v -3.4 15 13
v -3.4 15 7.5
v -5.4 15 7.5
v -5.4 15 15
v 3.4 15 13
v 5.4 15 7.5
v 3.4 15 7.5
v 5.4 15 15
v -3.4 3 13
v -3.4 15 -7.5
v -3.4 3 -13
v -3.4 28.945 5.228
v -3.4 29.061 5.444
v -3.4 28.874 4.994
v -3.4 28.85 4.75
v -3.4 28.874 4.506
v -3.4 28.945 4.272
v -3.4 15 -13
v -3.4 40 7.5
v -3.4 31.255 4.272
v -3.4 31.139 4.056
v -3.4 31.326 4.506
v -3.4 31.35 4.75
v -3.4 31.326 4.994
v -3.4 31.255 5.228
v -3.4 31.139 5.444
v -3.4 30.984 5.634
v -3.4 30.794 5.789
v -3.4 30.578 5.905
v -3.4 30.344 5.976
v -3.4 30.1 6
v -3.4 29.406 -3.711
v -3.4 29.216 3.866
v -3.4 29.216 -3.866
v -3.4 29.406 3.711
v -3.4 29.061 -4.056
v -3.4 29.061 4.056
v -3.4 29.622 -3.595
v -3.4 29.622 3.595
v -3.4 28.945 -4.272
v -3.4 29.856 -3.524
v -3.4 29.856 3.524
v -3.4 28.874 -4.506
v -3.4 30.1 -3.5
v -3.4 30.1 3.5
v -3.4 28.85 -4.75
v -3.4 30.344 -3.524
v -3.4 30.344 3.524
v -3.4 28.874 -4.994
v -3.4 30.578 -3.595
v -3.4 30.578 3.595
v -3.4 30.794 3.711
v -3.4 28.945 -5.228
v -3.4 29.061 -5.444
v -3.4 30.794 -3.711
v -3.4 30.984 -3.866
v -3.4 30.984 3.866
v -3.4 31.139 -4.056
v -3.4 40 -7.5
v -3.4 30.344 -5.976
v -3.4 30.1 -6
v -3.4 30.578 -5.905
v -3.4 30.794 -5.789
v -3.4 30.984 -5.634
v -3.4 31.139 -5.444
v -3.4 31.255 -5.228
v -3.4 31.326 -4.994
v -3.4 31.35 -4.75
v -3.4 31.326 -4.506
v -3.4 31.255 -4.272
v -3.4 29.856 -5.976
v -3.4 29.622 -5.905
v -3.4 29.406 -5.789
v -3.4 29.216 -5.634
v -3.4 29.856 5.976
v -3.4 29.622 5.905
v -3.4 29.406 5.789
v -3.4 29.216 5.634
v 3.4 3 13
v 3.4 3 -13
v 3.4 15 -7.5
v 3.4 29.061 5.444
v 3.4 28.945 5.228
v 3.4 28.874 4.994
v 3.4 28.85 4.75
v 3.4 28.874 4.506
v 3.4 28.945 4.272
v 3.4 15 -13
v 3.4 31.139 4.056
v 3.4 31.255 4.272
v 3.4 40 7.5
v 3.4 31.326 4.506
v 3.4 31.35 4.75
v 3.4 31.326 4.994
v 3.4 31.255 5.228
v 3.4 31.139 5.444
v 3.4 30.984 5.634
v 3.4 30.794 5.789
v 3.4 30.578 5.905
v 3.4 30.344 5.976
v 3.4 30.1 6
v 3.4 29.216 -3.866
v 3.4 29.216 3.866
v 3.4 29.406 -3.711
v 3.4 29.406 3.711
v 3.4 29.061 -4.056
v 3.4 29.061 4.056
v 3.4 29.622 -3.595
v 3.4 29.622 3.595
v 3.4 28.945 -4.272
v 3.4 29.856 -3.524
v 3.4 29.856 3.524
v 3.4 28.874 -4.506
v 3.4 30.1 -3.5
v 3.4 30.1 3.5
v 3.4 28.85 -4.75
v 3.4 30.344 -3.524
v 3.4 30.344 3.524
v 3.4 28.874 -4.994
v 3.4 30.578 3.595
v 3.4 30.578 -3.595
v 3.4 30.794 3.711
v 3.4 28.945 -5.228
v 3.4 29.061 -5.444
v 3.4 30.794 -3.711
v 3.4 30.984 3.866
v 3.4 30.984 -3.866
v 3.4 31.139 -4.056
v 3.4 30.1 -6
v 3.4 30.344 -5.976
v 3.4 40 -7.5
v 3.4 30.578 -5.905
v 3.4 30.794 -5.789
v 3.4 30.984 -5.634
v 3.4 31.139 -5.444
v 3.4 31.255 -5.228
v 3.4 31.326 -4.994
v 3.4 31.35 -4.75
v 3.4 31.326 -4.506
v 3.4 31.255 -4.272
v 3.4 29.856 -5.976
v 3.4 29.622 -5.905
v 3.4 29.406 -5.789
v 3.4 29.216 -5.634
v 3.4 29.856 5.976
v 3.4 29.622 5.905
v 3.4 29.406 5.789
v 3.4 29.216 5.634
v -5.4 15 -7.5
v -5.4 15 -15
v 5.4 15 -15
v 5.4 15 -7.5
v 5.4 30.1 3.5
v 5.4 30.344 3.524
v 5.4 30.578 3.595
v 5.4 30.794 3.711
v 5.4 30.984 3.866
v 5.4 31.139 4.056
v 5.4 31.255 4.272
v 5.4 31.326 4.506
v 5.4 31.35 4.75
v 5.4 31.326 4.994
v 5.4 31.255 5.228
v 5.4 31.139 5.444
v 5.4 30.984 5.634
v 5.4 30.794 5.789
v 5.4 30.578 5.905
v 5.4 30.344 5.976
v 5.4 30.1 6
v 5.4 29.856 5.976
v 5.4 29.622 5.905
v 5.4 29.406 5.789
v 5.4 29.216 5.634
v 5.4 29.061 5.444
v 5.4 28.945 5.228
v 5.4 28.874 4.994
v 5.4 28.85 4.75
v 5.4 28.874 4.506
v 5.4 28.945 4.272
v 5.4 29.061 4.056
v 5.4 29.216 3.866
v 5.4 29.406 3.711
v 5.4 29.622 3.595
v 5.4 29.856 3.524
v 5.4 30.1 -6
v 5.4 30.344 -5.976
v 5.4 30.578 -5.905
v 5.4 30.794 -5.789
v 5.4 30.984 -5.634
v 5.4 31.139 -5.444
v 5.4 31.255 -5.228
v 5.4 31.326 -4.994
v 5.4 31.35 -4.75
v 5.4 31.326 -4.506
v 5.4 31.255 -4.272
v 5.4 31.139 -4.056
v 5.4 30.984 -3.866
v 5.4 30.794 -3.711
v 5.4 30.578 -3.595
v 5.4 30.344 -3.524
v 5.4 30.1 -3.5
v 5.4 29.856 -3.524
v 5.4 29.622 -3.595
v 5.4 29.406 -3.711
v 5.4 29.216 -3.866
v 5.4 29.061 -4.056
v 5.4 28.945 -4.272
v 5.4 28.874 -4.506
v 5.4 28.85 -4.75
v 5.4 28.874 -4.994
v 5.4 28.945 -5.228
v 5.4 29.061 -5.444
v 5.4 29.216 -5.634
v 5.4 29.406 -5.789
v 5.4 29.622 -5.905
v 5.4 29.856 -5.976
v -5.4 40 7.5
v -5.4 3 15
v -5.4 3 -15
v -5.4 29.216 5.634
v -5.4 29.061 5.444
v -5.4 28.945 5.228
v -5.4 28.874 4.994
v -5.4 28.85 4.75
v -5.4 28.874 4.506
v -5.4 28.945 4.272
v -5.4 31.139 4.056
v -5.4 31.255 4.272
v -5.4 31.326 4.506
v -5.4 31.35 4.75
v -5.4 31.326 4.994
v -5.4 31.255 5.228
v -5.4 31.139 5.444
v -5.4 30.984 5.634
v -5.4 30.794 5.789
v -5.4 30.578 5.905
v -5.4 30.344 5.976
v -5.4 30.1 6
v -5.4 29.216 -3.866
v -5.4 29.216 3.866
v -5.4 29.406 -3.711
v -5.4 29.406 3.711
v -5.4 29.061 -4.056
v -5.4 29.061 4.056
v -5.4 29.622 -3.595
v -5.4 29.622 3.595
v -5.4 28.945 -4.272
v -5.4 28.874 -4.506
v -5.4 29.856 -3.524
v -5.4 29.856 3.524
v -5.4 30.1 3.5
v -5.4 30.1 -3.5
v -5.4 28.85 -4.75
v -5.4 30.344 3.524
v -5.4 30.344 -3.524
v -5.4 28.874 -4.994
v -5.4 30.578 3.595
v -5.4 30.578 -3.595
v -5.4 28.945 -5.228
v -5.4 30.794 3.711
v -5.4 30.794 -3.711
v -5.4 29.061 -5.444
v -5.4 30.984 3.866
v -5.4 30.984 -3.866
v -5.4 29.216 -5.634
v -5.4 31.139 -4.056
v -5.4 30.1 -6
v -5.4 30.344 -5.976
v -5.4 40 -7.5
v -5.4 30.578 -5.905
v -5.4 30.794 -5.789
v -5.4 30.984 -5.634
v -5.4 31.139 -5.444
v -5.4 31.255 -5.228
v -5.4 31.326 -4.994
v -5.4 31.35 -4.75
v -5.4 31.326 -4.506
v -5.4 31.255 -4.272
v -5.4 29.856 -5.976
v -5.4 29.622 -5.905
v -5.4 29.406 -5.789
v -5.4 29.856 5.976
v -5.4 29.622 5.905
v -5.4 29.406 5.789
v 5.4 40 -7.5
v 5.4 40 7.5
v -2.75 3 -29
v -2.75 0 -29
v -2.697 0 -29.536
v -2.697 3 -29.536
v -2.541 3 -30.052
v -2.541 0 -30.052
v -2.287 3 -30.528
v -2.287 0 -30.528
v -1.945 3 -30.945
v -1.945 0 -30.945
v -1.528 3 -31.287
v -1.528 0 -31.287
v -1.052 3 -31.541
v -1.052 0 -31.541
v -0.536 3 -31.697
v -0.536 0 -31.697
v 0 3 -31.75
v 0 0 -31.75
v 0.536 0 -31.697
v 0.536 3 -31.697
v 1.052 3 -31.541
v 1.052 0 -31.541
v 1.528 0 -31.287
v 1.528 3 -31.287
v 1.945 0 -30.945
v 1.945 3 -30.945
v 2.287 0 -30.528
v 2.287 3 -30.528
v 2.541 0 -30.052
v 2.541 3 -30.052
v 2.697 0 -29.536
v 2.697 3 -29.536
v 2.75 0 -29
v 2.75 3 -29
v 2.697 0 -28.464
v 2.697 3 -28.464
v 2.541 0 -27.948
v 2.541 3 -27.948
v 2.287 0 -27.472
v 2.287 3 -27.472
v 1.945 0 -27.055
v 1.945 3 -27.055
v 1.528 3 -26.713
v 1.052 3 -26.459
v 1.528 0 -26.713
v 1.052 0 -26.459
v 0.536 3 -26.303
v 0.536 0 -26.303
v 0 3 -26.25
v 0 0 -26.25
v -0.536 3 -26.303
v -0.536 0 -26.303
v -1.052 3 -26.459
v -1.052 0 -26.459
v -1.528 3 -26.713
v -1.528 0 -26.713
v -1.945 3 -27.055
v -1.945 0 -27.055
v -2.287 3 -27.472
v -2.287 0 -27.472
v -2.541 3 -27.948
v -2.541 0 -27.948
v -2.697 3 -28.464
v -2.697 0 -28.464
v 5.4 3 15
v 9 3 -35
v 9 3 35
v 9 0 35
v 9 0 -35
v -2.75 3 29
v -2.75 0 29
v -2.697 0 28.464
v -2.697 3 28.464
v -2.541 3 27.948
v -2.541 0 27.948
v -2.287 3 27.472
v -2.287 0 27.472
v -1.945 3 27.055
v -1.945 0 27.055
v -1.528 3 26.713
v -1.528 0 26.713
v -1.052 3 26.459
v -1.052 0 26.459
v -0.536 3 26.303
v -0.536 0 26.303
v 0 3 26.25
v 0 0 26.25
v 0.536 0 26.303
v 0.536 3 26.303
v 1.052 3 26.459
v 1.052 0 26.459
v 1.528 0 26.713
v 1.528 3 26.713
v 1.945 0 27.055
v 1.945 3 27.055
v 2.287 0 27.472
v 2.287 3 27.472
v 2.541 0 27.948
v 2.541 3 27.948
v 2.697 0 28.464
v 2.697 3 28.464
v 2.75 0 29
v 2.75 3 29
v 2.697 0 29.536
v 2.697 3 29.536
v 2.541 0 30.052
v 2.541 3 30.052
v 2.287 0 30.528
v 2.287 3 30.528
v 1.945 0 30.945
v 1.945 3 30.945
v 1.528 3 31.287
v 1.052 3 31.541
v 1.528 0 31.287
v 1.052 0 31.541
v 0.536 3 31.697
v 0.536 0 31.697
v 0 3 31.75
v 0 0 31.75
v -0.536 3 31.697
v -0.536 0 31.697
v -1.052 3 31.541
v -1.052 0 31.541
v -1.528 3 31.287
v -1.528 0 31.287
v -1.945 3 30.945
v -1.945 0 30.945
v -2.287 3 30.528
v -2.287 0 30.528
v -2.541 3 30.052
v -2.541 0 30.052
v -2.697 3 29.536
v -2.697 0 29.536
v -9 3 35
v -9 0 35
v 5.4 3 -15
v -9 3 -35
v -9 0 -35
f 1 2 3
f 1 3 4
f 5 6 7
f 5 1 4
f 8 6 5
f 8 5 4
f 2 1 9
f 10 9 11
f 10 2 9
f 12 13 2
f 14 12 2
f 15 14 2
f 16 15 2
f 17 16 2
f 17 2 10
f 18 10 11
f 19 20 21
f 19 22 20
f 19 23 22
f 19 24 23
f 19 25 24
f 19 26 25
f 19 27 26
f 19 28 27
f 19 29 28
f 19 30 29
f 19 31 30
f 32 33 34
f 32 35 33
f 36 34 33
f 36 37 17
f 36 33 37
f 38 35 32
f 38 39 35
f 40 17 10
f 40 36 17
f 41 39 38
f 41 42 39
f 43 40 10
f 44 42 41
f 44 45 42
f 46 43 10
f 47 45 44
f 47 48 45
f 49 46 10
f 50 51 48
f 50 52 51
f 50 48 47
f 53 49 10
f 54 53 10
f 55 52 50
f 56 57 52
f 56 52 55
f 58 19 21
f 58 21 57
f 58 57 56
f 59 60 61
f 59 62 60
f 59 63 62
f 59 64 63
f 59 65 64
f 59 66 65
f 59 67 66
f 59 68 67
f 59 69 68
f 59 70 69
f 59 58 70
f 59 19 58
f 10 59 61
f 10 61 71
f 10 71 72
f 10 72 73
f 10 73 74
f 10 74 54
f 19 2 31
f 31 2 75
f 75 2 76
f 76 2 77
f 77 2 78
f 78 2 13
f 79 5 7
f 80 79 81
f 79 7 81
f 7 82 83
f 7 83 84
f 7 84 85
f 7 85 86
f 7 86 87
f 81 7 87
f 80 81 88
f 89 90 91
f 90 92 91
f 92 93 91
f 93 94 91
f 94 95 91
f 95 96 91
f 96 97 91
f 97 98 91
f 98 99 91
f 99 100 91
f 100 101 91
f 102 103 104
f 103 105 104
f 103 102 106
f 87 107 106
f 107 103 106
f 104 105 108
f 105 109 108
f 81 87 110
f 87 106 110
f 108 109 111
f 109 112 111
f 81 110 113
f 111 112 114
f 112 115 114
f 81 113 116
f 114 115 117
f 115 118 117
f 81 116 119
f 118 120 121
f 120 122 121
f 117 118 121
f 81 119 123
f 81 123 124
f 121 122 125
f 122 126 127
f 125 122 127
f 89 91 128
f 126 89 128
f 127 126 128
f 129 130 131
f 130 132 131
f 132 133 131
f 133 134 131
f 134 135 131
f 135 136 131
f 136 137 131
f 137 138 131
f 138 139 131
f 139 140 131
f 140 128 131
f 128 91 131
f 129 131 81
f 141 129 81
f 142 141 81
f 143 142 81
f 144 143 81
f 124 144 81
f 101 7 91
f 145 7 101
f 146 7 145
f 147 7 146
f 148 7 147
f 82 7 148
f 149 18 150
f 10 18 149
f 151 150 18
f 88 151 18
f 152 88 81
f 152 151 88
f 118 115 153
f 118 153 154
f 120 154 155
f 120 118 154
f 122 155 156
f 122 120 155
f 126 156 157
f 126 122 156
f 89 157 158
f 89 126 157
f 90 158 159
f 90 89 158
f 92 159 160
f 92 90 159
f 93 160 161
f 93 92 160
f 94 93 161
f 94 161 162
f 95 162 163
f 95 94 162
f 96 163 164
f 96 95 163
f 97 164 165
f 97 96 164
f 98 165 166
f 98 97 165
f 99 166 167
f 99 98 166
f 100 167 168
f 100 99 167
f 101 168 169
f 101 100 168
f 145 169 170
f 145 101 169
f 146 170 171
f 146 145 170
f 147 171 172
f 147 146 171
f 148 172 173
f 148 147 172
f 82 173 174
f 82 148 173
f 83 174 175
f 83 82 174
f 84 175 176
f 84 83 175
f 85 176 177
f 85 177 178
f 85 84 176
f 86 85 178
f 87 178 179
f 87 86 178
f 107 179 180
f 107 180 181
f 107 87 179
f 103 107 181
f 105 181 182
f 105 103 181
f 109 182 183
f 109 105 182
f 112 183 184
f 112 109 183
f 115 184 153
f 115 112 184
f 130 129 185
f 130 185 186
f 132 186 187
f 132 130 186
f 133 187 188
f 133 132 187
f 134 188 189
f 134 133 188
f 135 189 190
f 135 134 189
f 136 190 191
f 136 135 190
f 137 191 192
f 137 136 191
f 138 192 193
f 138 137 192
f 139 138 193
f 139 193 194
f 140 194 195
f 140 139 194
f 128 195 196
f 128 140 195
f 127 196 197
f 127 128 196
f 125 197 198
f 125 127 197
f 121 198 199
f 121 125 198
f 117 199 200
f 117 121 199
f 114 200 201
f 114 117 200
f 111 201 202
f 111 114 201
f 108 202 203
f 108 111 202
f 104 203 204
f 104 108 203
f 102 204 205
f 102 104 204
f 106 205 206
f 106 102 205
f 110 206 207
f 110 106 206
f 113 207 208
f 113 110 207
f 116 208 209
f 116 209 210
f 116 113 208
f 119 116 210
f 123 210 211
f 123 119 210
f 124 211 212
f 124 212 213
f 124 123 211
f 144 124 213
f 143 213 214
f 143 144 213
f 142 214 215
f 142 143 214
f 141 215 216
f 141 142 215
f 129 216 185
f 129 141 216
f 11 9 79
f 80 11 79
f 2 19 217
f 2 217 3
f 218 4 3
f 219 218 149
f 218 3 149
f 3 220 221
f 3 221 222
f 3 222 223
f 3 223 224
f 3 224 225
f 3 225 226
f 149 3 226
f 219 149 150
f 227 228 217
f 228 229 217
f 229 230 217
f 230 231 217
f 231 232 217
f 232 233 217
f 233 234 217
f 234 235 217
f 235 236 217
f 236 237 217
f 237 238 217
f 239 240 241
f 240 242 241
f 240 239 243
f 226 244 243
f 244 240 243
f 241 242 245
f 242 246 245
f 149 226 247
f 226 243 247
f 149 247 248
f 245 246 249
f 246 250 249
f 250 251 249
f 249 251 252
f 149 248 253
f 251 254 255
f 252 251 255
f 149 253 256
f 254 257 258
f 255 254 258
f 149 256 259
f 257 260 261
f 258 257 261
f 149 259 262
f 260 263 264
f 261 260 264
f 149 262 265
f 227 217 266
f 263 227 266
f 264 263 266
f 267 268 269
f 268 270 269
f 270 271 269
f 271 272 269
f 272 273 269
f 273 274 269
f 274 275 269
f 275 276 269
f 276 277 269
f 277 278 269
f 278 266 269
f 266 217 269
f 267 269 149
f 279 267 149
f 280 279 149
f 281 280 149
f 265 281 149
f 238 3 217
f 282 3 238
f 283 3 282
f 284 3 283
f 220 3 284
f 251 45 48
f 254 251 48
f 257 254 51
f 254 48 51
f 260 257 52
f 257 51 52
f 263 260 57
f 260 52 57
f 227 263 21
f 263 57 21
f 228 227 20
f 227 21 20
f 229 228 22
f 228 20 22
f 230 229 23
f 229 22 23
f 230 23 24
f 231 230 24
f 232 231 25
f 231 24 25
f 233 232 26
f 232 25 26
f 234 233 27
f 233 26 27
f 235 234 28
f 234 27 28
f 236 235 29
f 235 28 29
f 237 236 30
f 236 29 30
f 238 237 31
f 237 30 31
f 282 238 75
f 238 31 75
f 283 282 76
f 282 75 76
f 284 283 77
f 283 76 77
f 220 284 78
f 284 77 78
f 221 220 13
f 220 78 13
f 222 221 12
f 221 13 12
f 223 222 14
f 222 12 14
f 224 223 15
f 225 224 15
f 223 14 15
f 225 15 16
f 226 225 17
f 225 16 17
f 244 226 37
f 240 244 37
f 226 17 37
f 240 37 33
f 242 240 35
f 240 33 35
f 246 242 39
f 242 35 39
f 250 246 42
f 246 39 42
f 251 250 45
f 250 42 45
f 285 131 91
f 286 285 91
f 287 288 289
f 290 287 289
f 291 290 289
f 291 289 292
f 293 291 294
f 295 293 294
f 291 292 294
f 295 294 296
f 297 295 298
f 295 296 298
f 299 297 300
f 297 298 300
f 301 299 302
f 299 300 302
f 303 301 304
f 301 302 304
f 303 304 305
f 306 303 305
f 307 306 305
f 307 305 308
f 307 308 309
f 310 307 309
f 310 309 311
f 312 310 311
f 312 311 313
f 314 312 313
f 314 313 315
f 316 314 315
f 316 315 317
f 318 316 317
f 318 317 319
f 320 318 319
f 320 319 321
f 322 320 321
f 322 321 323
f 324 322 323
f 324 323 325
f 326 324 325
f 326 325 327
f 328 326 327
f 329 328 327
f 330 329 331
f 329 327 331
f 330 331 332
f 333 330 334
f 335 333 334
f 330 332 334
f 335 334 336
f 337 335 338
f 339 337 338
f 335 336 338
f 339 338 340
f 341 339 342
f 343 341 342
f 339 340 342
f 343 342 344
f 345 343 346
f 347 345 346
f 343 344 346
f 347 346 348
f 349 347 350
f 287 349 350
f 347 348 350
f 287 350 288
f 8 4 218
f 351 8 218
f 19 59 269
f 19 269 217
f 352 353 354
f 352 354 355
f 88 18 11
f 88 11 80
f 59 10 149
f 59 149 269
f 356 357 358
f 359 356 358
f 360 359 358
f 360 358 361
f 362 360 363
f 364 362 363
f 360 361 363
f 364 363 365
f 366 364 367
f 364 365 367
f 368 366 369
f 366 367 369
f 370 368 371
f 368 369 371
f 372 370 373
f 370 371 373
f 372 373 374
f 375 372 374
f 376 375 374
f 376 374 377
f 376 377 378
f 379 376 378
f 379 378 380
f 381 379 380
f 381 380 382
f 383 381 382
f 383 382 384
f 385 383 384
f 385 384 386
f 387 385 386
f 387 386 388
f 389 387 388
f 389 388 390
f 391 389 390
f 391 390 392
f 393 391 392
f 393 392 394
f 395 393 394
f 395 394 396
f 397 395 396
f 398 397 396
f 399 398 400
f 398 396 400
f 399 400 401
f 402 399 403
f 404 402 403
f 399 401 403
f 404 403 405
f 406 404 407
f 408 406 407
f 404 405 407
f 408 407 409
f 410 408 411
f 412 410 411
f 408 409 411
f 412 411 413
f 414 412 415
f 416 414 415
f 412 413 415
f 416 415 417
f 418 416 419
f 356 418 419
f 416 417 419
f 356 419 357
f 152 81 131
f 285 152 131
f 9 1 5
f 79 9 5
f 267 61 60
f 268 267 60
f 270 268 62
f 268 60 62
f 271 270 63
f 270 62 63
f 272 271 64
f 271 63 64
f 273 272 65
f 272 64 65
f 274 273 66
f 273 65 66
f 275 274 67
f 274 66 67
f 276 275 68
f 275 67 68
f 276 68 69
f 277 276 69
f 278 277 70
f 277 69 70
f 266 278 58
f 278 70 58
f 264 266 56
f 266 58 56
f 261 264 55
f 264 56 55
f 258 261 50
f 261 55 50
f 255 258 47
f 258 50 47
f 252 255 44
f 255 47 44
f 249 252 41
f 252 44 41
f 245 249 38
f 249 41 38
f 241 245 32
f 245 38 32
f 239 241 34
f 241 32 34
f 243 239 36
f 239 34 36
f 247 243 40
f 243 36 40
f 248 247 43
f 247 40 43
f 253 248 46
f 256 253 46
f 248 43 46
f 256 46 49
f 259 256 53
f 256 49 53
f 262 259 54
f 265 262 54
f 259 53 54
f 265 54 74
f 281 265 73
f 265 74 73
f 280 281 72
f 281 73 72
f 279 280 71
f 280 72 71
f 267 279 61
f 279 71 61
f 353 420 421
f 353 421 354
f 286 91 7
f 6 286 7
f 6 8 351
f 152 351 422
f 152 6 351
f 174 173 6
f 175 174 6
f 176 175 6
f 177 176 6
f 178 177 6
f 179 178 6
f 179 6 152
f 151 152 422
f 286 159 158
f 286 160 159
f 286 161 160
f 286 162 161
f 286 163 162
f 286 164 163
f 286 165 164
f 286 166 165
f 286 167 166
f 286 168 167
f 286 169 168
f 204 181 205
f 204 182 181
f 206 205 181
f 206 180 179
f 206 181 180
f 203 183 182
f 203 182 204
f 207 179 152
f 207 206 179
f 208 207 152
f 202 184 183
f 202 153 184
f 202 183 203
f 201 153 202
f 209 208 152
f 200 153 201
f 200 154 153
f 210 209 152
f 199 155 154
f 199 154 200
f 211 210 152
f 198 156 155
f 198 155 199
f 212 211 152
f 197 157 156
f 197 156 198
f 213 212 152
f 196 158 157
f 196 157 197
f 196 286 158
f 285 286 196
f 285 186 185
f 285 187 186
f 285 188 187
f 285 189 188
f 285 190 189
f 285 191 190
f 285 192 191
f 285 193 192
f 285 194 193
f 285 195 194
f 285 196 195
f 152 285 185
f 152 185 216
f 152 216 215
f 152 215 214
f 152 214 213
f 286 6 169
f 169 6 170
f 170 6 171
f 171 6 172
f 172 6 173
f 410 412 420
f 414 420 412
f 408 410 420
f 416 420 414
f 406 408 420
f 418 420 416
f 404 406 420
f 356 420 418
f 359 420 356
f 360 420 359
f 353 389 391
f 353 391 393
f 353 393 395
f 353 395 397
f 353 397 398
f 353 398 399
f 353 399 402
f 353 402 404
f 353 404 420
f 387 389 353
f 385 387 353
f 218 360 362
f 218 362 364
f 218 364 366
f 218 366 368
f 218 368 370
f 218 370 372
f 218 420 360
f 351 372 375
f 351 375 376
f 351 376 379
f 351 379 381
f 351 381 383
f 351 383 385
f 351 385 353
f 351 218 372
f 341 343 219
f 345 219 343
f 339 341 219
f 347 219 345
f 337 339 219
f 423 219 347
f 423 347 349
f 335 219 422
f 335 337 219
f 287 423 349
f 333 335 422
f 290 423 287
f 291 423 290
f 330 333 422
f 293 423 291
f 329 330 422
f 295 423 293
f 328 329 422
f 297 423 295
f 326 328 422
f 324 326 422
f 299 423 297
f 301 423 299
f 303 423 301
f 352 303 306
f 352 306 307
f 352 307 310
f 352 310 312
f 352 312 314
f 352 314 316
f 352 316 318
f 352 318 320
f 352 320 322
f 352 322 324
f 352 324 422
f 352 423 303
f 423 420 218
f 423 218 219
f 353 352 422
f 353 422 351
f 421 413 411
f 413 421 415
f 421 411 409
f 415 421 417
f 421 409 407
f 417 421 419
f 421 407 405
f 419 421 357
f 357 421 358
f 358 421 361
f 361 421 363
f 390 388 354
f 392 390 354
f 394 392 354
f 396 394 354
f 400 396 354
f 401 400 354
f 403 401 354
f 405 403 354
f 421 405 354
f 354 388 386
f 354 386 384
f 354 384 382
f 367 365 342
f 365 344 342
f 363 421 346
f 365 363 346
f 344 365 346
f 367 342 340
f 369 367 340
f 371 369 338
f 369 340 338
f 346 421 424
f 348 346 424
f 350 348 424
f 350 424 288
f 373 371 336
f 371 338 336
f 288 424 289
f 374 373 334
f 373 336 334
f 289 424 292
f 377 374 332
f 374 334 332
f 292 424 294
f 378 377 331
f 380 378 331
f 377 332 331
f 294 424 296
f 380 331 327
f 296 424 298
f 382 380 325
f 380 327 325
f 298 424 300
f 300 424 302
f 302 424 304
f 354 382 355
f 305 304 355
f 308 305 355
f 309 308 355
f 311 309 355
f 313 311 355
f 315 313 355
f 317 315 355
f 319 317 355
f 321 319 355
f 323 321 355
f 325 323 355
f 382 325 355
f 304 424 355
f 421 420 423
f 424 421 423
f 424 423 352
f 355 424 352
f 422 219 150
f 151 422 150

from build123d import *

# Parameters (mm, degrees)
SKETCH1_W            = 45
SKETCH1_H            = 30
BOSS_EXTRUDE1_DEPTH  = 3
SKETCH3_R            = 1.25
BOSS_EXTRUDE2_DEPTH  = 2
SKETCH4_W            = 10.8
SKETCH4_H            = 12
BOSS_EXTRUDE3_DEPTH  = 2
SKETCH10_W           = 18
SKETCH10_H           = 70
BOSS_EXTRUDE4_DEPTH  = 3
SKETCH11_W           = 13.5
SKETCH11_H           = 30
CUT_EXTRUDE1_DEPTH   = 3
M5_CLEARANCE_HOLE1_D = 5.5


with BuildPart() as part:
    # Sketch1 → Boss-Extrude1 (new body)
    with BuildSketch(Plane(origin=(0, 0, 0), x_dir=(1, 0, 0), z_dir=(0, 1, 0))):
        Rectangle(SKETCH1_W, SKETCH1_H)
    extrude(amount=BOSS_EXTRUDE1_DEPTH)

    # Sketch3 → Boss-Extrude2 (add)
    with BuildSketch(Plane(origin=(-3.4, 0, 0), x_dir=(0, 0, -1), z_dir=(1, 0, 0))):
        Polygon((7.5, 40), (-7.5, 40), (-7.5, 15), (-15, 15), (-15, 0), (15, 0), (15, 15), (7.5, 15), align=None)
        with Locations((-4.75, 30.1)):
            Circle(SKETCH3_R, mode=Mode.SUBTRACT)
        with Locations((4.75, 30.1)):
            Circle(SKETCH3_R, mode=Mode.SUBTRACT)
    extrude(amount=-BOSS_EXTRUDE2_DEPTH)

    # Mirror1: part across plane


with BuildPart() as part_1:
    add(part.part)
    add(part.part.mirror(Plane(origin=(0, 0, 0), x_dir=(0, 0, 1), z_dir=(1, 0, 0))))

    # Sketch4 → Boss-Extrude3 (add)
    with BuildSketch(Plane.XY.offset(15)):
        with Locations((0, 9)):
            Rectangle(SKETCH4_W, SKETCH4_H)
    boss_extrude3 = extrude(amount=-BOSS_EXTRUDE3_DEPTH)

    # Mirror2: Boss-Extrude3 across plane
    add(boss_extrude3.mirror(Plane.XY))

    # Sketch10 → Boss-Extrude4 (add)
    with BuildSketch(Plane(origin=(0, 3, 0), x_dir=(1, 0, 0), z_dir=(0, 1, 0))):
        Rectangle(SKETCH10_W, SKETCH10_H)
    extrude(amount=-BOSS_EXTRUDE4_DEPTH)

    # Sketch11 → Cut-Extrude1 (cut)
    with BuildSketch(Plane(origin=(0, 3, 0), x_dir=(1, 0, 0), z_dir=(0, 1, 0))):
        with Locations((-15.75, 0)):
            Rectangle(SKETCH11_W, SKETCH11_H)
    cut_extrude1 = extrude(amount=-CUT_EXTRUDE1_DEPTH, mode=Mode.SUBTRACT)

    # Mirror3: Cut-Extrude1 across plane
    add(cut_extrude1.mirror(Plane(origin=(0, 0, 0), x_dir=(0, 0, 1), z_dir=(1, 0, 0))), mode=Mode.SUBTRACT)

    # M5 Clearance Hole1 (through all)
    with Locations(Plane(origin=(0, 3, 0), x_dir=(1, 0, 0), z_dir=(0, 1, 0))):
        with Locations((0, -29), (0, 29)):
            Hole(M5_CLEARANCE_HOLE1_D / 2)


solid = part_1.part
